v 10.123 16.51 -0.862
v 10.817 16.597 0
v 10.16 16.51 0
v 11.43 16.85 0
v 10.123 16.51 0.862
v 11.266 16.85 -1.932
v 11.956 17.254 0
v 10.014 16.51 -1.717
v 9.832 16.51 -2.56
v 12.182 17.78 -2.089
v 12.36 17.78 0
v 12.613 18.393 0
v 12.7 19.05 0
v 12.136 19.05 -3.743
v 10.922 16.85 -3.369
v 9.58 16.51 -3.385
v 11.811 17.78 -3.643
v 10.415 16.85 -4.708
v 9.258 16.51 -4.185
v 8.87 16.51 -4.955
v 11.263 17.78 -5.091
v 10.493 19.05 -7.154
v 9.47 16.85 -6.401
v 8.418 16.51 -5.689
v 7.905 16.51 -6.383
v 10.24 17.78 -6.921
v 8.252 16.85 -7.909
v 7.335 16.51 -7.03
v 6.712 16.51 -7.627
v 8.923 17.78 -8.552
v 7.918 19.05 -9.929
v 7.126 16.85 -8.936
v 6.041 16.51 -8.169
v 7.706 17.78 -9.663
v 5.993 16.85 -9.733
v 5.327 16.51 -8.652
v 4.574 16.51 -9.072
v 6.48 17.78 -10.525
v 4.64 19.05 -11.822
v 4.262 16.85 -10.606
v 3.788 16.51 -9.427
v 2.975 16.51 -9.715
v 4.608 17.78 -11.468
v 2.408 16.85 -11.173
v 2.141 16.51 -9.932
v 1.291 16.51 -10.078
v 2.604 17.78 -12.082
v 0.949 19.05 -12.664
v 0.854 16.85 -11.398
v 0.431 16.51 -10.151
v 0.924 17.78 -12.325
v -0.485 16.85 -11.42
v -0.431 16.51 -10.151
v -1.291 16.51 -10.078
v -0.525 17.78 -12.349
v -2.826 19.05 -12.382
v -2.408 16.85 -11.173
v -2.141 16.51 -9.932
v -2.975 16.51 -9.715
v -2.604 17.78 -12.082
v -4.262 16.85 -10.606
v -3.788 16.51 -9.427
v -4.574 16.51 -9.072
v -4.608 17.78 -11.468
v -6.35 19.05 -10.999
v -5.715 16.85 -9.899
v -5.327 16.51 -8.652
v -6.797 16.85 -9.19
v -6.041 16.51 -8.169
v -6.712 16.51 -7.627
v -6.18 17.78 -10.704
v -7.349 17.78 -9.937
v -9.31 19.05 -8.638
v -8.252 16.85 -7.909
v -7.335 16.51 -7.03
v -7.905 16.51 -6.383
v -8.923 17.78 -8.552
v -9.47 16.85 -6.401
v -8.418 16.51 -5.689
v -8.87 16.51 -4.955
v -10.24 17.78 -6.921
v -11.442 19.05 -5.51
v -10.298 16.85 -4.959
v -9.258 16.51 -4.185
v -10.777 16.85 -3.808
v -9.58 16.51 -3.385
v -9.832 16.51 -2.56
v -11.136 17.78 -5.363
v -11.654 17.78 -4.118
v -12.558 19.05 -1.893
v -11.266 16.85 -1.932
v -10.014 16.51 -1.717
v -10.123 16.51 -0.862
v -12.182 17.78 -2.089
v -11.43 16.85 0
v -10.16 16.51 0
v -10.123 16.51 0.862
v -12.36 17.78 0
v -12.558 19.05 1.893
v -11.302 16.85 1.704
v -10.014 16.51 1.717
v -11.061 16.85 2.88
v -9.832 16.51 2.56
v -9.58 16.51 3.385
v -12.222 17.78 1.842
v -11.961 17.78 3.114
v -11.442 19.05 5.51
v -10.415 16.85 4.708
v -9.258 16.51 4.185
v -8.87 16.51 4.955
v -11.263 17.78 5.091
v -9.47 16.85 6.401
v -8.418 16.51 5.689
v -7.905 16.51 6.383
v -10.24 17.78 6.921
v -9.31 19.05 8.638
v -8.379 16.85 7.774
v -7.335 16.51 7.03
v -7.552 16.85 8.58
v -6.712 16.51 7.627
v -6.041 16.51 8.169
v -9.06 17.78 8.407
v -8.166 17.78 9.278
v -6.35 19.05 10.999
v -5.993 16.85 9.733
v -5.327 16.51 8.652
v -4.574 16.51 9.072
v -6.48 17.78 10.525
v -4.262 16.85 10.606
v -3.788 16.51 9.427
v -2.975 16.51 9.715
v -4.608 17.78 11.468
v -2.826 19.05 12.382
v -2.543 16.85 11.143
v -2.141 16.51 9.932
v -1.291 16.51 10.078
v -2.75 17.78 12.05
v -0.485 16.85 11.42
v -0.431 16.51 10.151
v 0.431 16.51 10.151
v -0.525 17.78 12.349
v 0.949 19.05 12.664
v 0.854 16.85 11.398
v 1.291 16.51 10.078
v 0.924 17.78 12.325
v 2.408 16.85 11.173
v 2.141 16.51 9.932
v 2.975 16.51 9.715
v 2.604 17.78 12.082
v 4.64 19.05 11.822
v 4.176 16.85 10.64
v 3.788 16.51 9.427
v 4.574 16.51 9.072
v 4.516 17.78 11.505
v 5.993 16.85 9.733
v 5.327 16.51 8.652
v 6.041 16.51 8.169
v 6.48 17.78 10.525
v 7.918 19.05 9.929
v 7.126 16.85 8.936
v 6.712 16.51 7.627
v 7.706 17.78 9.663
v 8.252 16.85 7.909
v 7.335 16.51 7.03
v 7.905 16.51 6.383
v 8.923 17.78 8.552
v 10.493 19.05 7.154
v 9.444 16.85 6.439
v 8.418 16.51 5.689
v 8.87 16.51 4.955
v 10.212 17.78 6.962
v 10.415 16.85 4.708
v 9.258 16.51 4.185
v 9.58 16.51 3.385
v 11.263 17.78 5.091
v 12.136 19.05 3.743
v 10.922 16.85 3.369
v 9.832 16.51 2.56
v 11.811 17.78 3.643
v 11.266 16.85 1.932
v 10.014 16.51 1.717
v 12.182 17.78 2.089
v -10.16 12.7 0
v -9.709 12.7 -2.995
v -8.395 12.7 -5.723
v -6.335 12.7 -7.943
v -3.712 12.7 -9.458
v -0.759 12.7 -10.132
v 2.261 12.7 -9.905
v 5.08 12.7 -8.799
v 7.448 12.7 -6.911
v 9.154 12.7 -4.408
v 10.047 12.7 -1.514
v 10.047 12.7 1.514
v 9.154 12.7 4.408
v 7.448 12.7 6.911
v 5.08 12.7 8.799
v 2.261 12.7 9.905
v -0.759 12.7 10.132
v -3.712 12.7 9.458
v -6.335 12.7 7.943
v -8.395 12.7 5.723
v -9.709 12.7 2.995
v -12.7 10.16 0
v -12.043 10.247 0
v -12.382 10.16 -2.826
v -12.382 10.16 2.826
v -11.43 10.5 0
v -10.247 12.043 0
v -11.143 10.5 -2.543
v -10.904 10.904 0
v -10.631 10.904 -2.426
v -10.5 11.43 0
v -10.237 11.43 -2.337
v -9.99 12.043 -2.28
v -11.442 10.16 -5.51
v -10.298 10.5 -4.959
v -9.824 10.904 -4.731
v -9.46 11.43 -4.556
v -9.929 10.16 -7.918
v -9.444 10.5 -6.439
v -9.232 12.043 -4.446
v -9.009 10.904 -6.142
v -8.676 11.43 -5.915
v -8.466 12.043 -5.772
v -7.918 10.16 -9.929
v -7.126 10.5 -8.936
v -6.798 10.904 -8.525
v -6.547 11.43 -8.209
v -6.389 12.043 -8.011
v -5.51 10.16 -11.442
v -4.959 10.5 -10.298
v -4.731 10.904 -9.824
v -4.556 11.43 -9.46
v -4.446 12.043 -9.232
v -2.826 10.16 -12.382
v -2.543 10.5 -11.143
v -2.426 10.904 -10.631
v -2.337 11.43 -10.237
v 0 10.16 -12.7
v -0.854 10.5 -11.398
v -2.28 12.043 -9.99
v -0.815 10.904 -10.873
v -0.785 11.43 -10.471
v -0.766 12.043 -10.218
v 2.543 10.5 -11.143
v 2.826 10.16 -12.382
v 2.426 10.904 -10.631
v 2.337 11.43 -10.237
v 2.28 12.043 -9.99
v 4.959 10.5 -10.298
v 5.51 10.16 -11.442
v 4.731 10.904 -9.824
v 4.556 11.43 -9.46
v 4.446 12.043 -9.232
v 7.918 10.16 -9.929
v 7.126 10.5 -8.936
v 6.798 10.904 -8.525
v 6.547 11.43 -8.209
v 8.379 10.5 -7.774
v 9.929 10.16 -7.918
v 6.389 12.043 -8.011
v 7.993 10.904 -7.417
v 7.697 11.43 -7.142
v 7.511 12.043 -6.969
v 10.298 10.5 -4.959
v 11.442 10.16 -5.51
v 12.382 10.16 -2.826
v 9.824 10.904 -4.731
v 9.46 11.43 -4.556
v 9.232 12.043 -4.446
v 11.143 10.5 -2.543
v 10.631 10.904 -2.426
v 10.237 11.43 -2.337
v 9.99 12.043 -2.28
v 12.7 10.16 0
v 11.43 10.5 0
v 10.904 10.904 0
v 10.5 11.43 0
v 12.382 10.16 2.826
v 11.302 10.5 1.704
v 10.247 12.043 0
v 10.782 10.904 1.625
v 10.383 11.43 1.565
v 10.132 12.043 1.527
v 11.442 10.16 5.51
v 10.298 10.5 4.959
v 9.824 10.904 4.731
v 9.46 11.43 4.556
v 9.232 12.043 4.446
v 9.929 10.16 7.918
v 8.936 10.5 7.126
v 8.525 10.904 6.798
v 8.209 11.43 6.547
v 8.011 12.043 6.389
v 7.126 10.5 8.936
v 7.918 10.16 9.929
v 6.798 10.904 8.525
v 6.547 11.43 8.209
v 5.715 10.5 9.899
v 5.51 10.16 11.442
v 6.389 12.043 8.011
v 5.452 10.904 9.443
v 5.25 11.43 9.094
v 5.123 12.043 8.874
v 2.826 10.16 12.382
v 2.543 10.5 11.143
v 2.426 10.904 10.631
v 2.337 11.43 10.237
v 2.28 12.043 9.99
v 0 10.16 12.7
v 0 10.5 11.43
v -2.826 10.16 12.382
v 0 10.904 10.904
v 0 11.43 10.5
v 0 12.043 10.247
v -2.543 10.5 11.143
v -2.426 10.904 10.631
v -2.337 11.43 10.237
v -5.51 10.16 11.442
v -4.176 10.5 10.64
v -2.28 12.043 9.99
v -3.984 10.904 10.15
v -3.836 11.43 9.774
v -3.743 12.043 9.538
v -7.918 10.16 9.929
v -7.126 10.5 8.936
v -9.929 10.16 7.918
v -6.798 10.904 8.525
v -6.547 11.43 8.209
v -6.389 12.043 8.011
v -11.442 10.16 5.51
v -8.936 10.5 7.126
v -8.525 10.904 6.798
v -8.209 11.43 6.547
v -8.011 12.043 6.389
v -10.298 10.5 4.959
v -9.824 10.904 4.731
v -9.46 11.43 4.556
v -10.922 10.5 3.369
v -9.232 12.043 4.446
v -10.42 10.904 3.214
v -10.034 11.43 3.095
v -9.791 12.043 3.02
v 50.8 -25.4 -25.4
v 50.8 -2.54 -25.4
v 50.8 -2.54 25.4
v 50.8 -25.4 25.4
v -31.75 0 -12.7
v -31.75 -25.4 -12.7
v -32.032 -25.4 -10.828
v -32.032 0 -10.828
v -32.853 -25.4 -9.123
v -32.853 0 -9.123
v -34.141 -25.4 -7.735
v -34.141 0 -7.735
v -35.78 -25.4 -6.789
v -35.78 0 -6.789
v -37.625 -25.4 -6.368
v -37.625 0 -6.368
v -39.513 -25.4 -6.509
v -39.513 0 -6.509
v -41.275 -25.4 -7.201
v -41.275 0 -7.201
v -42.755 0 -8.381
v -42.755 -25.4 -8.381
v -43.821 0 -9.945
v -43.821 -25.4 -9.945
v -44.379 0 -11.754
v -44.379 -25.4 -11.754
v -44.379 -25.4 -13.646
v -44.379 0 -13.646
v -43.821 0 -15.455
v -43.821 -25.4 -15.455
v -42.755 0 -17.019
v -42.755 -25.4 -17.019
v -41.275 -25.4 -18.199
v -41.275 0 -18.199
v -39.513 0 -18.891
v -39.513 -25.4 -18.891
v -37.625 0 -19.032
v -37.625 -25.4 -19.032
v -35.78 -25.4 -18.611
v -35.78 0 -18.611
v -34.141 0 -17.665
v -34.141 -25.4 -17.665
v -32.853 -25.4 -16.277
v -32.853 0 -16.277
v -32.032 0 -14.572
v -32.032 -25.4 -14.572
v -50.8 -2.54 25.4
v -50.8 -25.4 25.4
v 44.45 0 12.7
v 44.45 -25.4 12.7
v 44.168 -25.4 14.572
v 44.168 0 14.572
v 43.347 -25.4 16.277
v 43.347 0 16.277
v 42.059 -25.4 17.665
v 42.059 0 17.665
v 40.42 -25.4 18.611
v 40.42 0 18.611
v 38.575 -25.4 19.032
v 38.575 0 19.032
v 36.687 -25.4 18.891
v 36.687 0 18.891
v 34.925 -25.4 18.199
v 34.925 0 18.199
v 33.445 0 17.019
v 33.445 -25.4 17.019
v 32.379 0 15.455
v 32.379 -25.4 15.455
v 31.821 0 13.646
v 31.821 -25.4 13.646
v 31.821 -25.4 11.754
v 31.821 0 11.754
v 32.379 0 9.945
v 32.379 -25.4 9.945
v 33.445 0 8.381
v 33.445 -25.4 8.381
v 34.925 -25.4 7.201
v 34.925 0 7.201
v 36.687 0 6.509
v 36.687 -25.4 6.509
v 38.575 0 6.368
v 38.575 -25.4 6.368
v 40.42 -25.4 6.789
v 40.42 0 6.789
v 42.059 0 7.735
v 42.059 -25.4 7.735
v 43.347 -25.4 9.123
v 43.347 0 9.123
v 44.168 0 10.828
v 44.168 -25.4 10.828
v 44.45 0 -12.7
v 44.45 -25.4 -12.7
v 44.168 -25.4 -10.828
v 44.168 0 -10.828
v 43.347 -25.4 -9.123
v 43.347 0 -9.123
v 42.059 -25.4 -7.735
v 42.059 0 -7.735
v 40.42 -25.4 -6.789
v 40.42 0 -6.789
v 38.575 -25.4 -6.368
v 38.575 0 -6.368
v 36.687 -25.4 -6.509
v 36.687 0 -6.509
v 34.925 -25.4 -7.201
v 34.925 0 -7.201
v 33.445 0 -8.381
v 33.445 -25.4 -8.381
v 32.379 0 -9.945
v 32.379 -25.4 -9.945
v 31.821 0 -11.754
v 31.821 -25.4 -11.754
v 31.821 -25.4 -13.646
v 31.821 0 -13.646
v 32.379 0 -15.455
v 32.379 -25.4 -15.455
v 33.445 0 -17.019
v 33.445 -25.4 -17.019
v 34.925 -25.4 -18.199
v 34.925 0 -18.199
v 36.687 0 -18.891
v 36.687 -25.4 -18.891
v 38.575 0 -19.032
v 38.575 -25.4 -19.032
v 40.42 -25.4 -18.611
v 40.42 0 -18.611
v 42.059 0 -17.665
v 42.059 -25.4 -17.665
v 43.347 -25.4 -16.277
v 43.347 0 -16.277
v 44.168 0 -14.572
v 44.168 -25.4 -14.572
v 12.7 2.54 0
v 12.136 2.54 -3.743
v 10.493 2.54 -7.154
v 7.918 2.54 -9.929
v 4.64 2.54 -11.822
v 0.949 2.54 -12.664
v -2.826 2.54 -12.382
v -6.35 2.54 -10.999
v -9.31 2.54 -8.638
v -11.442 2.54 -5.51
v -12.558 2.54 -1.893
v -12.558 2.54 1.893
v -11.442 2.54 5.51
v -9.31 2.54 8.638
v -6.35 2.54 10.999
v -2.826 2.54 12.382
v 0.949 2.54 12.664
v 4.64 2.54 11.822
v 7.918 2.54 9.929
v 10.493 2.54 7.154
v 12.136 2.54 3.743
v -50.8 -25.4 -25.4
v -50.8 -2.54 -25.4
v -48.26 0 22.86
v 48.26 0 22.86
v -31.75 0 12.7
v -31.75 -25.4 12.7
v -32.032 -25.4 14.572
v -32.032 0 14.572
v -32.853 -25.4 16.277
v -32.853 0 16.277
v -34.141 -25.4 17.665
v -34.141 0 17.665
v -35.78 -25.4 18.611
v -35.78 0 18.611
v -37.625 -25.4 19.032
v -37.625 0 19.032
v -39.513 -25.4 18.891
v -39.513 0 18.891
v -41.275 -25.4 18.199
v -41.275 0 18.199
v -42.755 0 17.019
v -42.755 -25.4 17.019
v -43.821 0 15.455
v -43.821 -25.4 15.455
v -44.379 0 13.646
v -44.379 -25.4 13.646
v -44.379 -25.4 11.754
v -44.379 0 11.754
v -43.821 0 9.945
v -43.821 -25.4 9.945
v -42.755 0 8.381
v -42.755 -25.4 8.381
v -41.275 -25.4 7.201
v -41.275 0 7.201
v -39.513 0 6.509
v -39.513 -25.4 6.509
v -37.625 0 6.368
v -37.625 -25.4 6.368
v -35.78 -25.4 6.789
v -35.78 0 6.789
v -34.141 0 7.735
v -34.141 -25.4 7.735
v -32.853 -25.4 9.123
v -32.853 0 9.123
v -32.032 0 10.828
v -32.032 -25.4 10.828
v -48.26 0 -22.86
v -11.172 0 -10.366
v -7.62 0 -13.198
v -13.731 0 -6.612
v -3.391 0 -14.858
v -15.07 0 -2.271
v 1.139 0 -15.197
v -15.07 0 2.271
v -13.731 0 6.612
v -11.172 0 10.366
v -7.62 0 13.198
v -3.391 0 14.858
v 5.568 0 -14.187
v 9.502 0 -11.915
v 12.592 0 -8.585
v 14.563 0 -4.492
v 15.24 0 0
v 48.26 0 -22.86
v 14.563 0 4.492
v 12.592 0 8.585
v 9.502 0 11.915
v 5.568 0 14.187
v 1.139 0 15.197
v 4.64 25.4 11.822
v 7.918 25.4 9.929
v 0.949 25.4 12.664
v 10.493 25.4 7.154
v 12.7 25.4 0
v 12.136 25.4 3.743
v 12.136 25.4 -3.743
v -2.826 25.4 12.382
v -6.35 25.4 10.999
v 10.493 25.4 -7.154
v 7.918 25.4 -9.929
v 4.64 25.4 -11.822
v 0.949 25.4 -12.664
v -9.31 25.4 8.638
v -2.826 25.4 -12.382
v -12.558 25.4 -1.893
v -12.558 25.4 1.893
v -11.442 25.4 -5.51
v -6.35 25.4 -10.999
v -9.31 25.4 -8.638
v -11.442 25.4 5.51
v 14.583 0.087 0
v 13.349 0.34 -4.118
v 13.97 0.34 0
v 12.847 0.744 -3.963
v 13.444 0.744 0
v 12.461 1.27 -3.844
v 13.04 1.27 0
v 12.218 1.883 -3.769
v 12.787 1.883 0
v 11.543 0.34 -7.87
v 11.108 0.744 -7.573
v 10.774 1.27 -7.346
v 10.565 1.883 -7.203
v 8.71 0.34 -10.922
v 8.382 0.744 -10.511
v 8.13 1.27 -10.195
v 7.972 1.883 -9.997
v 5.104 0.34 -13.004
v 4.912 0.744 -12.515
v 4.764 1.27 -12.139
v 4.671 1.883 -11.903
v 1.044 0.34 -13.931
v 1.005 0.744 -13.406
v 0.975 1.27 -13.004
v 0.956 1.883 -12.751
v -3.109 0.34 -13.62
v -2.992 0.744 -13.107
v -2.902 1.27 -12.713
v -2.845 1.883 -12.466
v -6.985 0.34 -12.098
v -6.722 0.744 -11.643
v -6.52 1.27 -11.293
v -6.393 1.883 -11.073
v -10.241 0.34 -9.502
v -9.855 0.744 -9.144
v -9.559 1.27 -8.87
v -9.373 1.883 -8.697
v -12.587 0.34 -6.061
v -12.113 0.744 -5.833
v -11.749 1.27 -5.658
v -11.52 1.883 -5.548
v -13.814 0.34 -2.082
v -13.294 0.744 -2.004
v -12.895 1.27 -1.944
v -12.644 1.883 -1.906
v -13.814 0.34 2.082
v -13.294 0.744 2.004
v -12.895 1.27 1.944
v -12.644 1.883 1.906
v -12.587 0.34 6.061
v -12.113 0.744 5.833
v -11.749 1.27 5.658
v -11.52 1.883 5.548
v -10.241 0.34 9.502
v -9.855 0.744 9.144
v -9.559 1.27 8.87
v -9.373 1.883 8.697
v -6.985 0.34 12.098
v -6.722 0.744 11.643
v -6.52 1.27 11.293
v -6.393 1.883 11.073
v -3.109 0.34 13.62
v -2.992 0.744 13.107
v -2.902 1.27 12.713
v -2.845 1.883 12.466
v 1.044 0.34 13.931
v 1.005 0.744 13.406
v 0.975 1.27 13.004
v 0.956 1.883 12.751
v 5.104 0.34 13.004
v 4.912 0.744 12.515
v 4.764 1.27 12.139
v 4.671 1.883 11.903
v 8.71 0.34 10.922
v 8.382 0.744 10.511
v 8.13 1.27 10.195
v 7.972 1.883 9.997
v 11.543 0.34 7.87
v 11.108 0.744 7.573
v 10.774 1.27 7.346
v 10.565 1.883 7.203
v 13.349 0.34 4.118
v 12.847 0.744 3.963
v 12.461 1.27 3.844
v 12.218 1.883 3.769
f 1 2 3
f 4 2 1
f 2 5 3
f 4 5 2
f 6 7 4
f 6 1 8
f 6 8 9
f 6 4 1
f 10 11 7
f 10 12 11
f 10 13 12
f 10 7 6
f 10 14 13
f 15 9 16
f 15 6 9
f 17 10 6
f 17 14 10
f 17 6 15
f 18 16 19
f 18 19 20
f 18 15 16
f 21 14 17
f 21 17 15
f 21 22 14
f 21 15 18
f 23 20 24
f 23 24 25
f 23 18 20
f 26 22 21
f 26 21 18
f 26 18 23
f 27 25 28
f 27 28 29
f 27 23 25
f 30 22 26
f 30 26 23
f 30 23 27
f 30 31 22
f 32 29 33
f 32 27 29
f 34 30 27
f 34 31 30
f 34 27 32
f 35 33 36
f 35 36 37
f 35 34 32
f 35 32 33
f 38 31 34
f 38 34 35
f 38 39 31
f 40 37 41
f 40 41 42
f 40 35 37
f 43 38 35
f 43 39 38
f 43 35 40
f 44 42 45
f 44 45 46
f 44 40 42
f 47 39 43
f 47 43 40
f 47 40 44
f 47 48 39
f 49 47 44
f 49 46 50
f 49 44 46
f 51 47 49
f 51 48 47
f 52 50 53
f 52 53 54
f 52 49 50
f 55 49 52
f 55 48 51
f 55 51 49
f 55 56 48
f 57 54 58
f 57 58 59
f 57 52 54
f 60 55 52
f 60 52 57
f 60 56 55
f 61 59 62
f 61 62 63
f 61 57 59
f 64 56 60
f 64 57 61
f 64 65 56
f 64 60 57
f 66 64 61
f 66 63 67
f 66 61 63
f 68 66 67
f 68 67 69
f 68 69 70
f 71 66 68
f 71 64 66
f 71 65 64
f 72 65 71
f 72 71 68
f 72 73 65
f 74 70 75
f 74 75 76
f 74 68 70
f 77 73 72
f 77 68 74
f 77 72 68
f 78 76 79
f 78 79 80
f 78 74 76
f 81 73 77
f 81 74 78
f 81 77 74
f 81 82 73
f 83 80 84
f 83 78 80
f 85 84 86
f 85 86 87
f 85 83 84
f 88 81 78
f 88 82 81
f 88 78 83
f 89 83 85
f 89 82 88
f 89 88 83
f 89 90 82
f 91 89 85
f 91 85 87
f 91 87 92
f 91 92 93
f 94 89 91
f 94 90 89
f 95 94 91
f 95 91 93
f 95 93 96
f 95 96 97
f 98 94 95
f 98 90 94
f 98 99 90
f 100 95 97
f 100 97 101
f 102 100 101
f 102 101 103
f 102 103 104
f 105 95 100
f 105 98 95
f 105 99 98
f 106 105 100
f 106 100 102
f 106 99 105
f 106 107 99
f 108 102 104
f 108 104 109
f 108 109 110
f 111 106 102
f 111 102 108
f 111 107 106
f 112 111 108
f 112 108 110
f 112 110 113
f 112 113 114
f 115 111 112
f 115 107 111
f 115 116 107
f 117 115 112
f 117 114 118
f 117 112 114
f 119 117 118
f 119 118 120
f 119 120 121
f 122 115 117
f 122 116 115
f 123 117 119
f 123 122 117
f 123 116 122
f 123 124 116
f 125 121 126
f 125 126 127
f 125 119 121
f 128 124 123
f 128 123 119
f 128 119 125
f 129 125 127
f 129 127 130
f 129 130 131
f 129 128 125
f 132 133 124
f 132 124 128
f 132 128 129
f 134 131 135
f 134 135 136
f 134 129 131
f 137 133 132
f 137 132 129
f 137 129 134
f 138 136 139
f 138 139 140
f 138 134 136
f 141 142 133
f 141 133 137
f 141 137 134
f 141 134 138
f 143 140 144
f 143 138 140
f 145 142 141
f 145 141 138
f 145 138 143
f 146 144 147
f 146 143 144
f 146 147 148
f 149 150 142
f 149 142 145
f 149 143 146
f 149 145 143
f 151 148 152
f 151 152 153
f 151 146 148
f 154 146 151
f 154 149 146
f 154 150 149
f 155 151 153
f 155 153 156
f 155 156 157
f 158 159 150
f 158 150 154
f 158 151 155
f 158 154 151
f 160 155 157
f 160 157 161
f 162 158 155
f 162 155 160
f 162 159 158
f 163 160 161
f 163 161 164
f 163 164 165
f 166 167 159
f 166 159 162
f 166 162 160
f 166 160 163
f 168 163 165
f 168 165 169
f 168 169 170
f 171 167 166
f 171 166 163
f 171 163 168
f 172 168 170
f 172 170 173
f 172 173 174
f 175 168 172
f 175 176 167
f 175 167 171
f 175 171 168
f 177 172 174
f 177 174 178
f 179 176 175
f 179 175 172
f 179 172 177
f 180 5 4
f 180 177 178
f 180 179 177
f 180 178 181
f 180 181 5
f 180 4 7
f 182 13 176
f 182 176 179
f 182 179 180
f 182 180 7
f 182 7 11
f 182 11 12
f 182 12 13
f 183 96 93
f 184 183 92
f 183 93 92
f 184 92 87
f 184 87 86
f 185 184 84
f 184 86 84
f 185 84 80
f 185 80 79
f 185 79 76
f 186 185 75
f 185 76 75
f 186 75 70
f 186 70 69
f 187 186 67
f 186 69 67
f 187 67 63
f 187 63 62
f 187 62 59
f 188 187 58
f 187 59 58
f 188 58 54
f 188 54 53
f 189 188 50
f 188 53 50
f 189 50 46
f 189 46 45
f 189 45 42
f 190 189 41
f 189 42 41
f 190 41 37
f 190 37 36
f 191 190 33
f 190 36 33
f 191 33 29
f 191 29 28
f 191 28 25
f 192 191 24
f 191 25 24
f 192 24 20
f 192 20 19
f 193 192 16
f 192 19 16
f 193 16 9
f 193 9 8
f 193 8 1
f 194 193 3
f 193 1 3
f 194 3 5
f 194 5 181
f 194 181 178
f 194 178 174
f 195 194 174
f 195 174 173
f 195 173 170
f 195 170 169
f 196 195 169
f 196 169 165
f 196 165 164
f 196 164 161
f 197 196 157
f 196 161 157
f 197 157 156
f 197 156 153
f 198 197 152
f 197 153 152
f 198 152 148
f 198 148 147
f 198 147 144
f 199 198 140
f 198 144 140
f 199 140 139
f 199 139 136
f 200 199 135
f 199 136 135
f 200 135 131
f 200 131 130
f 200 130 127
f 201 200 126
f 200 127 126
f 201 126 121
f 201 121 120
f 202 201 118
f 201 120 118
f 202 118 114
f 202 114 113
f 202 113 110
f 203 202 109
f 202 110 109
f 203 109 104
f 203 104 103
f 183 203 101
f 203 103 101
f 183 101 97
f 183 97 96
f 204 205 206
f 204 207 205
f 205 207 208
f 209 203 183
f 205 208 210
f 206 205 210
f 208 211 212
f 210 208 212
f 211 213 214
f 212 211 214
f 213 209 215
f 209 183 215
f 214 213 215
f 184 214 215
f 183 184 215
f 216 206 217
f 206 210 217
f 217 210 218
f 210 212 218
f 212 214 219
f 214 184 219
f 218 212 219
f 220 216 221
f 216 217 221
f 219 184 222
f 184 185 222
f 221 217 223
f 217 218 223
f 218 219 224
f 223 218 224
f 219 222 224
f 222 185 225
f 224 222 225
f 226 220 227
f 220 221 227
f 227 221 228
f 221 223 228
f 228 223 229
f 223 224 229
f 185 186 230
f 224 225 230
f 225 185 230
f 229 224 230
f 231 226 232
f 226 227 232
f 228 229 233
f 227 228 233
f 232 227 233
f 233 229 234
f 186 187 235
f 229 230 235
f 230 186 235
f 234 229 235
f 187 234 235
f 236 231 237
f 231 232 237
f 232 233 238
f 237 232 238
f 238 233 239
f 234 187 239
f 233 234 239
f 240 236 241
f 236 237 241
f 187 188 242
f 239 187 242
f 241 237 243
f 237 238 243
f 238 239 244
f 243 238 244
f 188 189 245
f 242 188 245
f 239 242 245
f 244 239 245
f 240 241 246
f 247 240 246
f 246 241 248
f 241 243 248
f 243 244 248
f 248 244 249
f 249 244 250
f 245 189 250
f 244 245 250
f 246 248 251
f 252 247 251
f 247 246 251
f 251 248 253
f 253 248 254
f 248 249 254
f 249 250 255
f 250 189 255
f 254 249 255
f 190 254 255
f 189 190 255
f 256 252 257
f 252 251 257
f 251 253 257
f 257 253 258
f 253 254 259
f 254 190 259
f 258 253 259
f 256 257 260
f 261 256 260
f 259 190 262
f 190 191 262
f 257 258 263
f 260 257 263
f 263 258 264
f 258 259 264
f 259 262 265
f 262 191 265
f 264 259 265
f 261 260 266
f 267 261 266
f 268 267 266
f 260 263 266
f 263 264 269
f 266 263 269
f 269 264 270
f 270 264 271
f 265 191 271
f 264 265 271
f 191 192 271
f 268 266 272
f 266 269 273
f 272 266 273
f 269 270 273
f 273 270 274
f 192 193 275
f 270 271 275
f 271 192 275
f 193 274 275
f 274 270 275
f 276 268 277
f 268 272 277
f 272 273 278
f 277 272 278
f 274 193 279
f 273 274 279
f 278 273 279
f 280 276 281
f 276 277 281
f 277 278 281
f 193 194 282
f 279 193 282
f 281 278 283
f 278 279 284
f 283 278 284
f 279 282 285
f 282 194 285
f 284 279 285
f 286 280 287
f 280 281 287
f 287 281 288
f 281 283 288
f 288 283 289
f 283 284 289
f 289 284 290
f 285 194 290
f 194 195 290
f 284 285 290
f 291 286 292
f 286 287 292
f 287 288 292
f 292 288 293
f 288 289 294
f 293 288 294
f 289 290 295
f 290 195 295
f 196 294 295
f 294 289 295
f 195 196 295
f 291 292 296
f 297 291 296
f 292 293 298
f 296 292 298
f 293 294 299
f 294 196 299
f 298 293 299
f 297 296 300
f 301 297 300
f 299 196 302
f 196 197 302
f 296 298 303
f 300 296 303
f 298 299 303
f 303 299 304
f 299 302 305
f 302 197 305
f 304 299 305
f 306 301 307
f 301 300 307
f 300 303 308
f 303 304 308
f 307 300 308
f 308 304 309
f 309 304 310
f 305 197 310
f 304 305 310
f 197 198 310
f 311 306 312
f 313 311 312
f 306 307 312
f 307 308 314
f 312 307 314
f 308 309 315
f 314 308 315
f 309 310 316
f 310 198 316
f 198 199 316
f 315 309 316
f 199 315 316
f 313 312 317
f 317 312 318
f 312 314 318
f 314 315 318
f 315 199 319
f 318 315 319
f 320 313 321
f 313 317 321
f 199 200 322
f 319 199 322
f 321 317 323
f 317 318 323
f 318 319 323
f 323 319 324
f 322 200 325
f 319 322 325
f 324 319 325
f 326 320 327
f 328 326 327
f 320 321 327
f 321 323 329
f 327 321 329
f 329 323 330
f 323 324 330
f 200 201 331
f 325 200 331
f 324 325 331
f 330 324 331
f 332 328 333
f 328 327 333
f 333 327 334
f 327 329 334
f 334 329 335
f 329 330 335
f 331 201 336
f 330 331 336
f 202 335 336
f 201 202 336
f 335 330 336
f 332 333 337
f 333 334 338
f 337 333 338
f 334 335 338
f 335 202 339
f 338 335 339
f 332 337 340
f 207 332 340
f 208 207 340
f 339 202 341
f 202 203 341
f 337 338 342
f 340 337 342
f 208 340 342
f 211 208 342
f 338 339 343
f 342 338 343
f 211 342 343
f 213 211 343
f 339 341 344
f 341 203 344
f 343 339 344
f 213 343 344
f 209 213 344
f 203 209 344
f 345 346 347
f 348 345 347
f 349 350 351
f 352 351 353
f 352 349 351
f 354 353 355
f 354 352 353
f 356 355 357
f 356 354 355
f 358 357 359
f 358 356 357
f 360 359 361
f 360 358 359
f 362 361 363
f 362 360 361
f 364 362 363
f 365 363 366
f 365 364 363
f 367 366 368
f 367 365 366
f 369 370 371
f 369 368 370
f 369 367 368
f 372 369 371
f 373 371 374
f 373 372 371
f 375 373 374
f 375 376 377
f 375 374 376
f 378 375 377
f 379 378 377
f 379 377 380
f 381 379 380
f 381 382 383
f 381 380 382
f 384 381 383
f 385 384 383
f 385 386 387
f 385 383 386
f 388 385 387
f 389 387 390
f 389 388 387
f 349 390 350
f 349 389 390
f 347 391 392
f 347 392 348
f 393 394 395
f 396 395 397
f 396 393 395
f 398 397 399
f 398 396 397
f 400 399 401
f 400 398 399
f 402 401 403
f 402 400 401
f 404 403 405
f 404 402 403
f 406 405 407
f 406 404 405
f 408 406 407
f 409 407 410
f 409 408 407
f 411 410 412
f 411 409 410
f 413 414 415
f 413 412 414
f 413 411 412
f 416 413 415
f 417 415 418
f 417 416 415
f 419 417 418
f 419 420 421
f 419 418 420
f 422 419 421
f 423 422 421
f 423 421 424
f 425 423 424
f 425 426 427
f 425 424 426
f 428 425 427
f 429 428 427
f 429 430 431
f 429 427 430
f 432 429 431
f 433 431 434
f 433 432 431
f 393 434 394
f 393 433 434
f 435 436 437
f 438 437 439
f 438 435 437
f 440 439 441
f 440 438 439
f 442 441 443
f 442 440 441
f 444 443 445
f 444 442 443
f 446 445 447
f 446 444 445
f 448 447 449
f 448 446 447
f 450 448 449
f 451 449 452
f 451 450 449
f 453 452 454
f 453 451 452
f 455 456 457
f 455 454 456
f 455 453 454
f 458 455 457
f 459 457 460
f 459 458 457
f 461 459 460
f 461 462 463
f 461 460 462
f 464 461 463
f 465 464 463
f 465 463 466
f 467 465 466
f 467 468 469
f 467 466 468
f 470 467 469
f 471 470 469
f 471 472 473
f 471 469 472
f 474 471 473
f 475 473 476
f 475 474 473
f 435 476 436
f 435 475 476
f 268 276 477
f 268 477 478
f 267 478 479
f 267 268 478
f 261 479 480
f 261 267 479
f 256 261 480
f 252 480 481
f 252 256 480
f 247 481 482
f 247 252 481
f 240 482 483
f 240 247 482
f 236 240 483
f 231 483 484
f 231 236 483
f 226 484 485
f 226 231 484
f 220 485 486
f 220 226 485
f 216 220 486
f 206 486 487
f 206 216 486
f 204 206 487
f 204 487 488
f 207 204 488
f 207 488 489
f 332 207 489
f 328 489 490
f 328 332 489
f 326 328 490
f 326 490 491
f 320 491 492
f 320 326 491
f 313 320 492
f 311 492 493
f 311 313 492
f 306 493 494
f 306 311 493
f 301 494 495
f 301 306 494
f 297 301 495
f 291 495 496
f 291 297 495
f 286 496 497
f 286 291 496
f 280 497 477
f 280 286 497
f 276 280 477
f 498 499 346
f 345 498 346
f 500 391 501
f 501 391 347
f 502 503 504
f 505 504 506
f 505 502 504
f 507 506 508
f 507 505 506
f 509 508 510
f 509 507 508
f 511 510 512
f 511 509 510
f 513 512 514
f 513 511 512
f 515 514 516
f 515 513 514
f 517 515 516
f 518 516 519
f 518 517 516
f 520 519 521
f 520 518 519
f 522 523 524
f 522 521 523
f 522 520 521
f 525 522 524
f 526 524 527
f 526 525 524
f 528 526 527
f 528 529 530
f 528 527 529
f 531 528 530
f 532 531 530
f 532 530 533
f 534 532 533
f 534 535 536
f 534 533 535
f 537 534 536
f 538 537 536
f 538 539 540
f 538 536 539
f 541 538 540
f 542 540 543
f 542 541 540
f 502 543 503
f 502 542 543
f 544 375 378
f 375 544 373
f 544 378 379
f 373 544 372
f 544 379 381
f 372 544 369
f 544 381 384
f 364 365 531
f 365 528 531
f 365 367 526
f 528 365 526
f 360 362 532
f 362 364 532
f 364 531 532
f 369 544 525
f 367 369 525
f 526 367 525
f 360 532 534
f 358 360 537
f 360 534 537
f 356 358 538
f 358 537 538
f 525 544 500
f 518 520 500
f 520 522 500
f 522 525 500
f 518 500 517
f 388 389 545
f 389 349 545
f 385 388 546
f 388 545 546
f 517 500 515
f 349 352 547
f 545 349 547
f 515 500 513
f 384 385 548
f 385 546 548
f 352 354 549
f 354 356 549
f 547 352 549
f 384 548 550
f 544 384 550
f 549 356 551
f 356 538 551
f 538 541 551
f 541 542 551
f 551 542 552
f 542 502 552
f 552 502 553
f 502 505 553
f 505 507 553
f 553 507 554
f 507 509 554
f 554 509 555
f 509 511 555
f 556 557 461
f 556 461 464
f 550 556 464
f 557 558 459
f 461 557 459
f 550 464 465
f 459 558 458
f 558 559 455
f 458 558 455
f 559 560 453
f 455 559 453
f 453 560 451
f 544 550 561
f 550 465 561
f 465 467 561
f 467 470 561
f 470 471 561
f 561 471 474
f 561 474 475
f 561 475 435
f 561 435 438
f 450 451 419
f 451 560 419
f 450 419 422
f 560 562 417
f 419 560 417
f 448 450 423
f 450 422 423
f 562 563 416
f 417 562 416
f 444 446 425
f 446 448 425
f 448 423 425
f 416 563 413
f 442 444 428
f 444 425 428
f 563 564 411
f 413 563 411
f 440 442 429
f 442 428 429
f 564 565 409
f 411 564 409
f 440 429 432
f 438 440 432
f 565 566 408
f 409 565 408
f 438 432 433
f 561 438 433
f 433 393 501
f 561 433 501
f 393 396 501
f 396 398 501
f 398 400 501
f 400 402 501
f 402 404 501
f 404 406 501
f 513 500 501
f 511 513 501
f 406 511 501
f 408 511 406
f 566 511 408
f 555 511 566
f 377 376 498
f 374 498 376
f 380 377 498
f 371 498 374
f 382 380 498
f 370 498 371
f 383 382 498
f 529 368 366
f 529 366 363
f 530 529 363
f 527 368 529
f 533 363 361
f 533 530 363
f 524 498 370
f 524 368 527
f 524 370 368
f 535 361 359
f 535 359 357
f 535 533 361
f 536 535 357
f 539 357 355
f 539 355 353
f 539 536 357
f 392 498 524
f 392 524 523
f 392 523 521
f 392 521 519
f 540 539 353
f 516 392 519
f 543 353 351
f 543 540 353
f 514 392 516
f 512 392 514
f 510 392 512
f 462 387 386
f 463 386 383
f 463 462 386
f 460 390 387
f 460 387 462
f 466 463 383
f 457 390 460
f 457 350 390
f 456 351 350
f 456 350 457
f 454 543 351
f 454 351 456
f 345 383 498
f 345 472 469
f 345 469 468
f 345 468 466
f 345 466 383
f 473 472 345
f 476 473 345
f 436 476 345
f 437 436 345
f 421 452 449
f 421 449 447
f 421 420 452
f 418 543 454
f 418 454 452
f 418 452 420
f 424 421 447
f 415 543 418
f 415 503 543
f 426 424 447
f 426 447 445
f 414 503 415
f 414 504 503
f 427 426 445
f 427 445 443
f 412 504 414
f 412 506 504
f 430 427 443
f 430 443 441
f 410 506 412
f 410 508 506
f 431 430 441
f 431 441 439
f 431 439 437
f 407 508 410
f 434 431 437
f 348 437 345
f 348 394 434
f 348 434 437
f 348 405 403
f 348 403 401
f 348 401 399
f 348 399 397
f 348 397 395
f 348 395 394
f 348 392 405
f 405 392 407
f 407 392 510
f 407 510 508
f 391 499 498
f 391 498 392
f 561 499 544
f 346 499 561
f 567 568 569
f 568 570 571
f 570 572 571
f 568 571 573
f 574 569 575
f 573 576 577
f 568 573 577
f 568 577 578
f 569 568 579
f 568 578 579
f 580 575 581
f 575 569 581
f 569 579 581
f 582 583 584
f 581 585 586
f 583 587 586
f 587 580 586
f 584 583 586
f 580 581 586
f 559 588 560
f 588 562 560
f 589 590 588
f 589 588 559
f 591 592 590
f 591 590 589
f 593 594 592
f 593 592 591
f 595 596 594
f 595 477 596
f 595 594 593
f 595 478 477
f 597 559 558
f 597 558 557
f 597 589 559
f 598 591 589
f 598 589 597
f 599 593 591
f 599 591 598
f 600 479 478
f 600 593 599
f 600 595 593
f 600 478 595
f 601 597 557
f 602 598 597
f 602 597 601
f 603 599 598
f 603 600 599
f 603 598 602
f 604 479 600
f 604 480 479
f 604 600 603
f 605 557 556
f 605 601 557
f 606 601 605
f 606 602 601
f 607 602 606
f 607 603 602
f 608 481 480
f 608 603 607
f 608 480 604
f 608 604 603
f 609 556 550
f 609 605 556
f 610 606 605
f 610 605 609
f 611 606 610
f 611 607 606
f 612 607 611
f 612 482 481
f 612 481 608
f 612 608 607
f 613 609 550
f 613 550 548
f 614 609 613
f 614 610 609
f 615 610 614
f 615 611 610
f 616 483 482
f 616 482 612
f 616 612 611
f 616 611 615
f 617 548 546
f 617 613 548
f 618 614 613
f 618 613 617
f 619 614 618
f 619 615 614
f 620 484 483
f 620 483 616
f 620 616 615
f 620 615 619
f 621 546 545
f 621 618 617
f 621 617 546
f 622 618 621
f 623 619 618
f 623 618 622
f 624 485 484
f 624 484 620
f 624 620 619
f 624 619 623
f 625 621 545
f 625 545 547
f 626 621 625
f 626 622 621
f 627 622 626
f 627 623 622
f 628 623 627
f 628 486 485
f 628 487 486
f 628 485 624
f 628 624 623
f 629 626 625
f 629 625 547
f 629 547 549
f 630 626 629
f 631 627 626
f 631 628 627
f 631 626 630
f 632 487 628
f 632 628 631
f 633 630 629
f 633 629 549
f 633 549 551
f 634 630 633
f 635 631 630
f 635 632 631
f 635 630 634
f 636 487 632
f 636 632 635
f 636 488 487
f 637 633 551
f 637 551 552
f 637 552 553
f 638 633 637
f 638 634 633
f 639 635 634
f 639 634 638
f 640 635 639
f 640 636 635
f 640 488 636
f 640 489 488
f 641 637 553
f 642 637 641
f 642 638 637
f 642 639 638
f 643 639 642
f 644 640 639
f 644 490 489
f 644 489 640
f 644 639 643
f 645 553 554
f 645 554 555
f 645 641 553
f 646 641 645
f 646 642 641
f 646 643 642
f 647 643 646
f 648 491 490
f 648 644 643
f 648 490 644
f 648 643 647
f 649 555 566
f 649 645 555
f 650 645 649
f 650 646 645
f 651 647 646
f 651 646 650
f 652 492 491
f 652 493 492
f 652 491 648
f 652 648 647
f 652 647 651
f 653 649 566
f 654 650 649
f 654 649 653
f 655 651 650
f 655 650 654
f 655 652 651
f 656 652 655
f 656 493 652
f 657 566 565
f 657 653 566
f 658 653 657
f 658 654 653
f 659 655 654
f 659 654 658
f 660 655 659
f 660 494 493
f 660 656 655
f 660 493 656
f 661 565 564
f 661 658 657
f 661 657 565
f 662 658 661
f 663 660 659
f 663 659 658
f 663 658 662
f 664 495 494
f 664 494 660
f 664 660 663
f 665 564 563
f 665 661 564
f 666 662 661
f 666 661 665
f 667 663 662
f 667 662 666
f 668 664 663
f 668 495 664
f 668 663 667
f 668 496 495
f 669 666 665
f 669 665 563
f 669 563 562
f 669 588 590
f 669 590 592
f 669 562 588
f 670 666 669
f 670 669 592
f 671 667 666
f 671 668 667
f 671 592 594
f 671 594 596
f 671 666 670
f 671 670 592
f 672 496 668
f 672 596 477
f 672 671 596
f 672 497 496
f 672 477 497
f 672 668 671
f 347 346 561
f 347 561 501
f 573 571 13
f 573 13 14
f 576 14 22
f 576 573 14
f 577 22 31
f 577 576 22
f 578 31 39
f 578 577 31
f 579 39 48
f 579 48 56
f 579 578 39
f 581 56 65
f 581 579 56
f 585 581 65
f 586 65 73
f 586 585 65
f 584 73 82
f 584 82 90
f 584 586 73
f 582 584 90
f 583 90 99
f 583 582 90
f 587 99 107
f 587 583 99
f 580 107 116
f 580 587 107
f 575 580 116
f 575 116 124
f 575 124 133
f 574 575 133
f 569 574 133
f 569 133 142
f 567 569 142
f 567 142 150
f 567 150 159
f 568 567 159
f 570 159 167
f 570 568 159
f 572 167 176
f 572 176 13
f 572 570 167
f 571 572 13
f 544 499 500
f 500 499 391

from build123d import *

# Parameters (mm, degrees)
F0_W     = 101.6
F0_H     = 50.8
F1_DEPTH = 25.4
F2_R     = 6.35
F3_DEPTH = 25.401
F4_W     = 12.7
F4_H     = 25.4
F6_W     = 8.9851264438
F6_H     = 6.35
F8_R     = 2.53999
F9_SIZE  = 2.54


# Not quite as in the source:
# - a fillet or chamfer is up to 0.001 mm smaller than in the source, because OpenCascade refuses the exact size


with BuildPart() as f1:
    # F0 (on Front) → F1 (new body)
    with BuildSketch(Plane.XZ):
        Rectangle(F0_W, F0_H)
    extrude(amount=F1_DEPTH)

    # F2 (on Front) → F3 (cut, through all)
    with BuildSketch(Plane.XZ):
        with Locations((-38.1, 12.7)):
            Circle(F2_R)
        with Locations((-38.1, -12.7)):
            Circle(F2_R)
        with Locations((38.1, -12.7)):
            Circle(F2_R)
        with Locations((38.1, 12.7)):
            Circle(F2_R)
    extrude(amount=F3_DEPTH, mode=Mode.SUBTRACT)

    # F4 (on Top) → F5 (revolve)
    with BuildSketch(Plane.XY):
        with Locations((6.35, 12.7)):
            Rectangle(F4_W, F4_H)
    revolve(axis=Axis((0, 12.7, 0), (0, 1, 0)))

    # F6 (on Top) → F7 (revolve, cut)
    with BuildSketch(Plane.XY):
        with Locations((-14.6525632219, 13.335)):
            Rectangle(F6_W, F6_H)
    revolve(axis=Axis((0, 6.6735967994, 0), (0, -1, 0)), mode=Mode.SUBTRACT)

    # F8 (radius 2.54 in the source; OpenCascade refuses exactly that, so slightly less here)
    f8_edges = [f1.edges().sort_by_distance(p)[0] for p in [
        (-12.7, 0, 0),
        (10.16, 10.16, 0),
        (-12.7, 16.51, 0),
    ]]
    fillet(f8_edges, radius=F8_R)

    # F9
    f9_edges = [f1.edges().sort_by_distance(p)[0] for p in [
        (0, 0, 25.4),
        (50.8, 0, 0),
        (0, 0, -25.4),
        (-50.8, 0, 0),
    ]]
    chamfer(f9_edges, length=F9_SIZE)


solid = f1.part
